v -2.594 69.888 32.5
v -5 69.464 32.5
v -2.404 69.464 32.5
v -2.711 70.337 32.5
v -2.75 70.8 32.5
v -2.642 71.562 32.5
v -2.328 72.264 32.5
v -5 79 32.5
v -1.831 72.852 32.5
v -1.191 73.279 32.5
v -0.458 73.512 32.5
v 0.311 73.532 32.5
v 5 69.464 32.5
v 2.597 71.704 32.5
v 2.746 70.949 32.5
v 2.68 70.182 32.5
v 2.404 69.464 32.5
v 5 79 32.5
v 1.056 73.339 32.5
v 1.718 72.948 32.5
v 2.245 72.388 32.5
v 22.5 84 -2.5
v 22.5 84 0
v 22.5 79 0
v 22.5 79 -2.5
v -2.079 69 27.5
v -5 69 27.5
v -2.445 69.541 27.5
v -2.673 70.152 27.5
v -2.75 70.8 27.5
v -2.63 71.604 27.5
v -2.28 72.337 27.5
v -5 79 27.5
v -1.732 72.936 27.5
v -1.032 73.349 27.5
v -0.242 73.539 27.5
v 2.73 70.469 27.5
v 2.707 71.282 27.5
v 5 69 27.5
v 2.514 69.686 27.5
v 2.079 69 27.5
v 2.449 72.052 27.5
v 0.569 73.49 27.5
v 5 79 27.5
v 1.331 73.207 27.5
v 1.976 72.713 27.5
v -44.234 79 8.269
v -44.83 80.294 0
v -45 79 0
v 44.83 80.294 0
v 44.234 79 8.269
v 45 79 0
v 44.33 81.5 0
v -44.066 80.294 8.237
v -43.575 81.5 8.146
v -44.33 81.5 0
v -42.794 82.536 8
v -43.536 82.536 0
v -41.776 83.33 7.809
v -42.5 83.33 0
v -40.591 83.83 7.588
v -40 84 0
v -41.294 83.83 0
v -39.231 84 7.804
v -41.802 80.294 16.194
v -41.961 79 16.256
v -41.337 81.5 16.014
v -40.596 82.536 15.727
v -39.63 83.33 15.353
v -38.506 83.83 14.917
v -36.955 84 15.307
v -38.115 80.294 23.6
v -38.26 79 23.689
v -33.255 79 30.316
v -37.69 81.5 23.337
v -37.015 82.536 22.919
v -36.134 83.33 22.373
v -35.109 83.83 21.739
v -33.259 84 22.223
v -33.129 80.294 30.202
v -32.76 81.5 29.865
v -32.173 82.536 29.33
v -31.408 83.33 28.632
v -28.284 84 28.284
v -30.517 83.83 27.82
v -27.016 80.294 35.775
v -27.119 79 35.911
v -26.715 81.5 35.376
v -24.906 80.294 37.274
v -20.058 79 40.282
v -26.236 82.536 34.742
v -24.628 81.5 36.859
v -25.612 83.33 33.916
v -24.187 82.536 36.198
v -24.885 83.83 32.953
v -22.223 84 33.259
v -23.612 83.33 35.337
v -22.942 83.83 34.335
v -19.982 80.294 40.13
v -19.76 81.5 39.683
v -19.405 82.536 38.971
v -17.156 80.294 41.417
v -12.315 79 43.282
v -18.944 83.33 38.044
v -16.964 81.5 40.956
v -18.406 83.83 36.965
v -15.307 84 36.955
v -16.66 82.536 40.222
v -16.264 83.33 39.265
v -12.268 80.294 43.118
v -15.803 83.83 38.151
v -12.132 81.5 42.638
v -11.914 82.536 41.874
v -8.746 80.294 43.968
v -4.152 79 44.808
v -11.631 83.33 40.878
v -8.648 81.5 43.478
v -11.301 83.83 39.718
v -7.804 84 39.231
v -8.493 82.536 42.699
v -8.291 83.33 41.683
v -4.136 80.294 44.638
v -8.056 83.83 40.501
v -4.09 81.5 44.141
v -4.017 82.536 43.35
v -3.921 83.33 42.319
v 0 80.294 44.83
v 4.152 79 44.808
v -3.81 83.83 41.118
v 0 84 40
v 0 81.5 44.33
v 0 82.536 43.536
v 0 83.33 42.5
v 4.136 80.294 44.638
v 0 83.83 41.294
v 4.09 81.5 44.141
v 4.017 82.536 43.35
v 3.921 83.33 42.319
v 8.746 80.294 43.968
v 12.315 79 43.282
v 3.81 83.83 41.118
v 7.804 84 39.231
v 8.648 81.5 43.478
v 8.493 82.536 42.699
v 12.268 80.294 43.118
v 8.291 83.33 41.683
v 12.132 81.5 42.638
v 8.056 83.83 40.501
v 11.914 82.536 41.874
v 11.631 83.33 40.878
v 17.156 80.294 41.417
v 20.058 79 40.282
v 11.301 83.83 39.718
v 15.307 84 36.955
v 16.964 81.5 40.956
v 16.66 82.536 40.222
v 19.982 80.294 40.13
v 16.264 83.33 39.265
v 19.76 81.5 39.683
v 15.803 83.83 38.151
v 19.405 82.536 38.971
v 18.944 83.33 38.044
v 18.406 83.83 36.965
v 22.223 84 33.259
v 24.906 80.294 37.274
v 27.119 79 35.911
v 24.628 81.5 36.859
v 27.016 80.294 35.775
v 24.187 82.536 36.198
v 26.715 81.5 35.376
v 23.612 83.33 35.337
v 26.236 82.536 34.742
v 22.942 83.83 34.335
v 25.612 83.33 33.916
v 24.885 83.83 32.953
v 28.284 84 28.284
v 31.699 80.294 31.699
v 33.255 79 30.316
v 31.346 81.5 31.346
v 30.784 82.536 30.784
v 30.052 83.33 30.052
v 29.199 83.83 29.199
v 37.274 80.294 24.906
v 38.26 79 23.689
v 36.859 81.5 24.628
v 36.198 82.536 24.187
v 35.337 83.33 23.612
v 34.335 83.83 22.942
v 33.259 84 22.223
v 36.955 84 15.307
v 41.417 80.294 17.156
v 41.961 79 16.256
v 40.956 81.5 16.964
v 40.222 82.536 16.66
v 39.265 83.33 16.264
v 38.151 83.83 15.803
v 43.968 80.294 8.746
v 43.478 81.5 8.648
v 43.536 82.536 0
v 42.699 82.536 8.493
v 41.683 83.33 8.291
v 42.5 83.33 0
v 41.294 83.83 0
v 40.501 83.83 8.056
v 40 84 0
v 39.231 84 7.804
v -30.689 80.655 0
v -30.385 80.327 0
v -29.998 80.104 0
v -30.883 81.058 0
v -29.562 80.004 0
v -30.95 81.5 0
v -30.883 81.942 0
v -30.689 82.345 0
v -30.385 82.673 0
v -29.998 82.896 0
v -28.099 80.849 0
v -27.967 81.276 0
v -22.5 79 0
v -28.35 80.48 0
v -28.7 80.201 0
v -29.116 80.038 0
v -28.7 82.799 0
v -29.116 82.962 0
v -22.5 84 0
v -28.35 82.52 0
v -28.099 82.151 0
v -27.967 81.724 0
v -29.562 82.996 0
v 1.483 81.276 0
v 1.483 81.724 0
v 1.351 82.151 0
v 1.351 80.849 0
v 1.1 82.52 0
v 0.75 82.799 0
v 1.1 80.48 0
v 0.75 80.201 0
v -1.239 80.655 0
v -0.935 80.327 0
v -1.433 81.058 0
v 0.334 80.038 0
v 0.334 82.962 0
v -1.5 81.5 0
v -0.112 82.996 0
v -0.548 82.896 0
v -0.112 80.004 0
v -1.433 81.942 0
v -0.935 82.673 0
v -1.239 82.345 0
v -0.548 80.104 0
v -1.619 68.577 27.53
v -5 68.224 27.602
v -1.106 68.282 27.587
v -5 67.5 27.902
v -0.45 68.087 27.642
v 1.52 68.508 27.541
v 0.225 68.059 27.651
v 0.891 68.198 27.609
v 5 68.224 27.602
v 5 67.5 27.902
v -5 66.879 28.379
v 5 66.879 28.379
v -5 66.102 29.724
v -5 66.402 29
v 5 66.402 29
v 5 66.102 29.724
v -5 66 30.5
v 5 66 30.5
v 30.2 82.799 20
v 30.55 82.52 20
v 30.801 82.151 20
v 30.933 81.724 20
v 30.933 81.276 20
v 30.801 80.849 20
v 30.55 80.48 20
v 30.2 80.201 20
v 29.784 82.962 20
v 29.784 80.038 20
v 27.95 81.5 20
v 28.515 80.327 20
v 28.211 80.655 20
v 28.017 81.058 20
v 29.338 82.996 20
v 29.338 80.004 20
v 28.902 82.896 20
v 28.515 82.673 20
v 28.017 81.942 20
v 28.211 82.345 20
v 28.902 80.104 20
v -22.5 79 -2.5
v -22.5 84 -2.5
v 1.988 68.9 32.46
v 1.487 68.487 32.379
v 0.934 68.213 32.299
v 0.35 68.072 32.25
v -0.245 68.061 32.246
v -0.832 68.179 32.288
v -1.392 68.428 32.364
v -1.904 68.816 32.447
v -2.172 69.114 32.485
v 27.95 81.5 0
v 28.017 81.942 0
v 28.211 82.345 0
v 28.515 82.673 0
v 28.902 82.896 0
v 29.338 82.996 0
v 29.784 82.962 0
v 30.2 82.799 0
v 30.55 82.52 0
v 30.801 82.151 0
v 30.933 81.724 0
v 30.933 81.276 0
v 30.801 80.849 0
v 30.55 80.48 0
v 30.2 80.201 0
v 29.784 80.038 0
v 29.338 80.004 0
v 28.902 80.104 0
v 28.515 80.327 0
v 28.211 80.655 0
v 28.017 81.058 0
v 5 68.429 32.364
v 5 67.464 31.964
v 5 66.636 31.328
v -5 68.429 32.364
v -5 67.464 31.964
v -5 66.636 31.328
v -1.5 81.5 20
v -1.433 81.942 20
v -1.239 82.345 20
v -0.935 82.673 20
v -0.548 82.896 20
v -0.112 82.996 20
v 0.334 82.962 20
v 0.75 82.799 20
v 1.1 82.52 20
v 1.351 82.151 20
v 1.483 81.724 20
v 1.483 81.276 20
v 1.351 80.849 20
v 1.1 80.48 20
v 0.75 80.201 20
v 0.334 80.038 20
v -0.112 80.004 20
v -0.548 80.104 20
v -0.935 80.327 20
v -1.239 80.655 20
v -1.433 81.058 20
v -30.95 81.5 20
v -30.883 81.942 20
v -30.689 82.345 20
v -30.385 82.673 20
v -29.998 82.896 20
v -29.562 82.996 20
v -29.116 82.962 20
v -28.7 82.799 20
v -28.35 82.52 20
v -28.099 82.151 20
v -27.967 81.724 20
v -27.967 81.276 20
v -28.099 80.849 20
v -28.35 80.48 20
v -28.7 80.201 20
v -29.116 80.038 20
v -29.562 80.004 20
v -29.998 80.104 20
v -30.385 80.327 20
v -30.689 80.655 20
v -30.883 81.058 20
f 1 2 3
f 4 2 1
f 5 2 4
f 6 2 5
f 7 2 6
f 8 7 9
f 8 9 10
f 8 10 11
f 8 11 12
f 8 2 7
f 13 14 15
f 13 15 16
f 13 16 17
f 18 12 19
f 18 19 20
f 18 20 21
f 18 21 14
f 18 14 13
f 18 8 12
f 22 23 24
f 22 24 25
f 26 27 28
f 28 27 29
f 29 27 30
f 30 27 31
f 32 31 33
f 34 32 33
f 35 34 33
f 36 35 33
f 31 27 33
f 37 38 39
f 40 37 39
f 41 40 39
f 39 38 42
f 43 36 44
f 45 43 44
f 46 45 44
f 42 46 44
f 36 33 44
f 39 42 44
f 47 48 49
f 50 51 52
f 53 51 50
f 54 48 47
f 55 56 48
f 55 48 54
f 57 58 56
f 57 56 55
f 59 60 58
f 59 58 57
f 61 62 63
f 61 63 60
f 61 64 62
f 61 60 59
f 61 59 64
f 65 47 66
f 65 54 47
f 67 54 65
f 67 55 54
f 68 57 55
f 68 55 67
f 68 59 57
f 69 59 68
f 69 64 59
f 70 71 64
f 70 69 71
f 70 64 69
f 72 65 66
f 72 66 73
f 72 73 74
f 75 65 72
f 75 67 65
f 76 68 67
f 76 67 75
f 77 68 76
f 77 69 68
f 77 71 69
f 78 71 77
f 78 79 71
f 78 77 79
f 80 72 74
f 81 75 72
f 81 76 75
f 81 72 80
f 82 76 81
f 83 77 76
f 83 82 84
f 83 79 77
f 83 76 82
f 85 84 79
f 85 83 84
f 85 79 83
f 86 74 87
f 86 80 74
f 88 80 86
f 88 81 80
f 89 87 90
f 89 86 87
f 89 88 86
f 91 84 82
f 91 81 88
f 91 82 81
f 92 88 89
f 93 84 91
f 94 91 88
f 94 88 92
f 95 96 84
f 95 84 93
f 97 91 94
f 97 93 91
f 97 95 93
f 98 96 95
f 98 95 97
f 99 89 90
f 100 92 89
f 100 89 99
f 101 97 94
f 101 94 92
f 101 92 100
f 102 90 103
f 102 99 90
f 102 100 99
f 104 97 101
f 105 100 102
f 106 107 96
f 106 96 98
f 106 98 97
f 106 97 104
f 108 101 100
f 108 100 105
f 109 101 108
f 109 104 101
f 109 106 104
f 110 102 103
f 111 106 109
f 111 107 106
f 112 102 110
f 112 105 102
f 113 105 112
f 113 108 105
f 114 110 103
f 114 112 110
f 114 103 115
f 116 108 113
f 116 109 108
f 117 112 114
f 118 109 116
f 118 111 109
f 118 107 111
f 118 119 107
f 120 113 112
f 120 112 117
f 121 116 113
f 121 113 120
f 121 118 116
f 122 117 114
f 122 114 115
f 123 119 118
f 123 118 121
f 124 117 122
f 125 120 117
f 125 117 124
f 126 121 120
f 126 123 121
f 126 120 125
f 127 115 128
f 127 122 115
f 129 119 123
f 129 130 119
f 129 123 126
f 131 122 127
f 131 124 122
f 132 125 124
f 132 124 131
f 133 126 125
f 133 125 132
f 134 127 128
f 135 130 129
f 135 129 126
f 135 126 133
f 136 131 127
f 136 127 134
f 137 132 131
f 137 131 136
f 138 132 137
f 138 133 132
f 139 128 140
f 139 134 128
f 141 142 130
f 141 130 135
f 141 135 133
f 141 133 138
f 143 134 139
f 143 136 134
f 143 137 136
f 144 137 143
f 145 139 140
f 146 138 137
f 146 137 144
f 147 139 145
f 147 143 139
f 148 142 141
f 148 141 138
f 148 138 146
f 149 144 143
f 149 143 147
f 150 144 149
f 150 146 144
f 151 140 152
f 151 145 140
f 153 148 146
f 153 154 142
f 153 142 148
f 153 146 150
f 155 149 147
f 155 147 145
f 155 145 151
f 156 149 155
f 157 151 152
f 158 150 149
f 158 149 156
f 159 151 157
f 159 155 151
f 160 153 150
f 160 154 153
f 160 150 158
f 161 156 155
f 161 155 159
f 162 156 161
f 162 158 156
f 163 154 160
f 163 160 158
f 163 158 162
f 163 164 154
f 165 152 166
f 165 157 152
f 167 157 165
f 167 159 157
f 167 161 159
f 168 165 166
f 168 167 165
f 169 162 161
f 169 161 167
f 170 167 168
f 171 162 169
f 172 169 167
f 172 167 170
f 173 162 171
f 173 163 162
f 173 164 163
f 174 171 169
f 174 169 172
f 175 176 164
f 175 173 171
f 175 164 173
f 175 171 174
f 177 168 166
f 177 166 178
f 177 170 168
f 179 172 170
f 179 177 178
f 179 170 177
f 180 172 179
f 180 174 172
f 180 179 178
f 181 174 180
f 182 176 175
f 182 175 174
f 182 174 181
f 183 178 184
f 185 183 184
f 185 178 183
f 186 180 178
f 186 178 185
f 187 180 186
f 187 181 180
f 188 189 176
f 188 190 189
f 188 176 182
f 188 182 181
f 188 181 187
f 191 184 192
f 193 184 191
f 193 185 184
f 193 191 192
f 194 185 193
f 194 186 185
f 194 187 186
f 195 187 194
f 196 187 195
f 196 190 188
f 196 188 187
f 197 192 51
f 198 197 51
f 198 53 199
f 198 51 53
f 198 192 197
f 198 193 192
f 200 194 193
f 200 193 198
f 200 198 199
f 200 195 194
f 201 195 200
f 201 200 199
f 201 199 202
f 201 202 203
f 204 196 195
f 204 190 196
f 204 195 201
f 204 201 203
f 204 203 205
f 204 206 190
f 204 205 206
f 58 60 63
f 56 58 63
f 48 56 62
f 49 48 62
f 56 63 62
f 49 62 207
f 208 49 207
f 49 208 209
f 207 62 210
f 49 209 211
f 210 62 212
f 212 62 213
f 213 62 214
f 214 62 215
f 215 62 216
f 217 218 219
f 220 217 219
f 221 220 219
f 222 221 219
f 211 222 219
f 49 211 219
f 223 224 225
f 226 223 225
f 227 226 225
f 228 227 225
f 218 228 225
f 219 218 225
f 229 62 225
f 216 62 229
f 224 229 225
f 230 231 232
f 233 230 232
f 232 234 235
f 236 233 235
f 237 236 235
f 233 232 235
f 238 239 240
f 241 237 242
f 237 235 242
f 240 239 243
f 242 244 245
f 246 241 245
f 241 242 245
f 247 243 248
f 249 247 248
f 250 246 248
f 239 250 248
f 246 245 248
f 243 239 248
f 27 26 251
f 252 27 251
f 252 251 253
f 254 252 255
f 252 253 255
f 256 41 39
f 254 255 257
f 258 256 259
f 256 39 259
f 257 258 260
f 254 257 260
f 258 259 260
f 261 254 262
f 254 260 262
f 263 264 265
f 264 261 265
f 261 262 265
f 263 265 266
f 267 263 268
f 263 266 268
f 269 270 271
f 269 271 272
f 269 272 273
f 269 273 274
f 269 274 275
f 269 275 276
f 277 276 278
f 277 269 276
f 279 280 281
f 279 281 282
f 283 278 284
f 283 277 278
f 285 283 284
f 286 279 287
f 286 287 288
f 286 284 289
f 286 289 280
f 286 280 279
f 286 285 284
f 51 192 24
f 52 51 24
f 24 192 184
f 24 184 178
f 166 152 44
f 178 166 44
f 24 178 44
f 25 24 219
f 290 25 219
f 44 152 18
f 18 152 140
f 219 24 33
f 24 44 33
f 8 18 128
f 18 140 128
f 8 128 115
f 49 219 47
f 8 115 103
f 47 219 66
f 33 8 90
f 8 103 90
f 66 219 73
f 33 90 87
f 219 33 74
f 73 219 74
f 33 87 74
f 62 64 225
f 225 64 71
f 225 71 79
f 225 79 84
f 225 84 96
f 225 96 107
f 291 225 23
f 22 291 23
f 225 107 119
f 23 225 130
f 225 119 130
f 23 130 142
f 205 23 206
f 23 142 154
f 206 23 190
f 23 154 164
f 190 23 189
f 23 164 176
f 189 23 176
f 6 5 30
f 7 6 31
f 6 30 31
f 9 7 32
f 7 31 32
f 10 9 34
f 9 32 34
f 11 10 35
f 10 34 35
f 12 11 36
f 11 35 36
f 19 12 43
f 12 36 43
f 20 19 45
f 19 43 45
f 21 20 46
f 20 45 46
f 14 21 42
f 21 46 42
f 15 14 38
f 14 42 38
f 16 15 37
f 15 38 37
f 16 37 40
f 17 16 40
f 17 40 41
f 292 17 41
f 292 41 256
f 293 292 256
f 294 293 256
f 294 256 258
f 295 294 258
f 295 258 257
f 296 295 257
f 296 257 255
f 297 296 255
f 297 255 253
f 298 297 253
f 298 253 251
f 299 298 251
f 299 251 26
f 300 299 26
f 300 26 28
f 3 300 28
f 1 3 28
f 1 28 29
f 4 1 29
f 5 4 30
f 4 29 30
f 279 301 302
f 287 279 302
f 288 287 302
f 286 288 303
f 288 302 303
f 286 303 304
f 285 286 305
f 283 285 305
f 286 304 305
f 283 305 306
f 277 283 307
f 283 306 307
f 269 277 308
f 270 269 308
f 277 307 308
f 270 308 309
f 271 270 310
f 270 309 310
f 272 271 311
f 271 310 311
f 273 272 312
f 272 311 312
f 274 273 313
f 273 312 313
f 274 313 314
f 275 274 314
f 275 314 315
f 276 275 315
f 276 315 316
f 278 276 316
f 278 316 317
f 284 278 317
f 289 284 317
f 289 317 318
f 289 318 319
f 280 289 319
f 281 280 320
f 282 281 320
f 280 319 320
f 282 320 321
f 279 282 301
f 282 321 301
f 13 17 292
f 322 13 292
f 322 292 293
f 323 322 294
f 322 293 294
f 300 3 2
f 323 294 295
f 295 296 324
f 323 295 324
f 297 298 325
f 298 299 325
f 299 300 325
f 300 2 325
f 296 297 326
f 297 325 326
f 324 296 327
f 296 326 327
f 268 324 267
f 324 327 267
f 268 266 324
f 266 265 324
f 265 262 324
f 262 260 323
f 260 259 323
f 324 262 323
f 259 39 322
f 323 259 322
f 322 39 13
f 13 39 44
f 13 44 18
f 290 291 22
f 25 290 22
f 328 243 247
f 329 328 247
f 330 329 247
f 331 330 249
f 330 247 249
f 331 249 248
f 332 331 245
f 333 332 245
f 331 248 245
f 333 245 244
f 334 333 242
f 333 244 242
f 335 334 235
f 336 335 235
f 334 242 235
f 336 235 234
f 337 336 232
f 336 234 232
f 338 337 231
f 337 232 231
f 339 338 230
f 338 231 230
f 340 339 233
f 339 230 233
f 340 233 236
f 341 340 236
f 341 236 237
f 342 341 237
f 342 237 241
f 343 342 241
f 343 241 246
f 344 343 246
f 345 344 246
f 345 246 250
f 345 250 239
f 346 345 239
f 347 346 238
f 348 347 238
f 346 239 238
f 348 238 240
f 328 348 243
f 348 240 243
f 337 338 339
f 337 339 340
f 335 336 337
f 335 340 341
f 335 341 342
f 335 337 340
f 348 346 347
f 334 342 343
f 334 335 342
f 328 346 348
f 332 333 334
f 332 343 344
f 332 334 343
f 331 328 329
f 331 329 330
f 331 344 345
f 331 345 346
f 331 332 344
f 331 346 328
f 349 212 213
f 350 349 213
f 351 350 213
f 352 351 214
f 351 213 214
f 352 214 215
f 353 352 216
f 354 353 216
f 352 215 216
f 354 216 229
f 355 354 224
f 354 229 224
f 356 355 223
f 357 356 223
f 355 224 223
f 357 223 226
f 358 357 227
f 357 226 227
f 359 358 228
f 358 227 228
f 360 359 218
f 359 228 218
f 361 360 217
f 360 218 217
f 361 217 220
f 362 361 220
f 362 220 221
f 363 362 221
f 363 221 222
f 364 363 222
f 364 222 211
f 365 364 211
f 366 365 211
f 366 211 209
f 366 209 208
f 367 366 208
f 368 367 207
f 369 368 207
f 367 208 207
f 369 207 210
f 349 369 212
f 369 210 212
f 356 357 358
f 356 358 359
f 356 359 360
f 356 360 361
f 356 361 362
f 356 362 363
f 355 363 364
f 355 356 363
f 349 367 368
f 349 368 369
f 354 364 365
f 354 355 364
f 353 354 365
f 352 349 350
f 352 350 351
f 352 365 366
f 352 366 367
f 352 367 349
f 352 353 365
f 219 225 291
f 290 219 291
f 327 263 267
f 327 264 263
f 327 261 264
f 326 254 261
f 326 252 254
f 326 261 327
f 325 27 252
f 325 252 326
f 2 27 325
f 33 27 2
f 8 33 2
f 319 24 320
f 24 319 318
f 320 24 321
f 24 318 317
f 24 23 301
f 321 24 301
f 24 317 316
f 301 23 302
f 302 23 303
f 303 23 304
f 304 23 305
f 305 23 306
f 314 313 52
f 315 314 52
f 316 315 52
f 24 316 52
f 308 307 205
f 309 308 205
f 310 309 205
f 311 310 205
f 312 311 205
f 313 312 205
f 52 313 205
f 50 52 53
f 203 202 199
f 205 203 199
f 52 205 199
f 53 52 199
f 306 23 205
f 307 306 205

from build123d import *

# Parameters (mm, degrees)
CUT_EXTRUDE1_DEPTH           = 5
CUT_EXTRUDE3_DEPTH           = 45
SKETCH8_R                    = 43
CUT_EXTRUDE4_DEPTH           = 32
SKETCH9_R                    = 32
SKETCH9_R_2                  = 24.5
CUT_EXTRUDE5_DEPTH           = 14
SKETCH10_R                   = 26
CUT_EXTRUDE6_DEPTH           = 14
FILLET1_R                    = 7
FILLET2_R                    = 7
SKETCH12_W                   = 6.590120242
SKETCH12_H                   = 30.5
CUT_REVOLVE1_ANGLE           = 60
CUT_REVOLVE1_OTHER_WAY_ANGLE = 60
CUT_EXTRUDE12_DEPTH          = 5
SKETCH18_W                   = 13
SKETCH18_H                   = 8
CUT_EXTRUDE13_DEPTH          = 5
INTERSECT1_OUTLINE_R         = 45
INTERSECT1_DEPTH             = 79
SKETCH20_W                   = 10
SKETCH20_H                   = 5
BOSS_EXTRUDE1_DEPTH          = 13
BOSS_EXTRUDE3_DEPTH          = 5
SKETCH19_R                   = 1.5
CUT_EXTRUDE14_DEPTH          = 20
SKETCH23_W                   = 25
SKETCH23_H                   = 7
CUT_EXTRUDE15_DEPTH          = 7
SKETCH24_W                   = 45
SKETCH24_H                   = 2.5
CUT_EXTRUDE16_DEPTH          = 5
SKETCH25_R                   = 2.75
CUT_EXTRUDE17_DEPTH          = 5
FILLET4_R                    = 3
FILLET6_R                    = 4


with BuildPart() as part:
    # Sketch1 → Revolve1 (revolve)
    with BuildSketch(Plane.XY, mode=Mode.PRIVATE) as revolve1_sk:
        with BuildLine():
            Line((22.5, 0), (32, 0))
            ThreePointArc((32, 0), (33.414213562, 0.585786438), (34, 2))
            Line((34, 2), (34, 18))
            Line((34, 18), (43, 18))
            ThreePointArc((43, 18), (44.414213562, 18.585786438), (45, 20))
            Line((45, 20), (45, 79))
            ThreePointArc((45, 79), (43.535533906, 82.535533906), (40, 84))
            Line((40, 84), (0, 84))
            Line((0, 84), (0, 18))
            Line((0, 18), (22.5, 18))
            Line((22.5, 18), (22.5, 0))
        make_face()
    revolve(revolve1_sk.sketch.rotate(Axis((0, 2, 0), (0, 1, 0)), 90), axis=Axis((0, 2, 0), (0, 1, 0)))

    # Sketch5 → Cut-Extrude1 (cut)
    with BuildSketch(Plane(origin=(0, 84, 0), x_dir=(1, 0, 0), z_dir=(0, 1, 0))):
        with BuildLine():
            Line((-45, 0), (-40, 0))
            Line((-40, 0), (40, 0))
            Line((40, 0), (45, 0))
            ThreePointArc((45, 0), (0, 45), (-45, 0))
        make_face()
    extrude(amount=-CUT_EXTRUDE1_DEPTH, mode=Mode.SUBTRACT)

    # Sketch7 → Cut-Extrude3 (cut)
    with BuildSketch(Plane.XZ.offset(-18)):
        with BuildLine():
            Line((-21, 0), (21, 0))
            ThreePointArc((21, 0), (0, -21), (-21, 0))
        make_face()
    extrude(amount=-CUT_EXTRUDE3_DEPTH, mode=Mode.SUBTRACT)

    # Sketch8 → Cut-Extrude4 (cut)
    with BuildSketch(Plane(origin=(0, 76.5, 0), x_dir=(1, 0, 0), z_dir=(0, 1, 0))):
        with Locations(Location((0, 0, 0), (0, 0, 270))):
            Circle(SKETCH8_R)
        with BuildLine():
            Line((22.912878475, -2), (-22.912878475, -2))
            ThreePointArc((-22.912878475, -2), (0, 23), (22.912878475, -2))
        make_face(mode=Mode.SUBTRACT)
    extrude(amount=-CUT_EXTRUDE4_DEPTH, mode=Mode.SUBTRACT)

    # Sketch9 → Cut-Extrude5 (cut)
    with BuildSketch(Plane(origin=(0, 2, 0), x_dir=(-1, 0, 0), z_dir=(0, -1, 0))):
        with Locations(Location((0, 0, 0), (0, 0, 90))):
            Circle(SKETCH9_R)
        with Locations(Location((0, 0, 0), (0, 0, 90))):
            Circle(SKETCH9_R_2, mode=Mode.SUBTRACT)
    extrude(amount=-CUT_EXTRUDE5_DEPTH, mode=Mode.SUBTRACT)

    # Sketch10 → Cut-Extrude6 (cut)
    with BuildSketch(Plane(origin=(0, 2, 0), x_dir=(-1, 0, 0), z_dir=(0, -1, 0))):
        Circle(SKETCH10_R)
    extrude(amount=-CUT_EXTRUDE6_DEPTH, mode=Mode.SUBTRACT)

    # Fillet1
    fillet1_edges = [part.edges().sort_by_distance(p)[0] for p in [
        (21, 40.5, 0),
        (-21, 40.5, 0),
    ]]
    fillet(fillet1_edges, radius=FILLET1_R)

    # Fillet2
    fillet2_edges = [part.edges().sort_by_distance(p)[0] for p in [
        (-22.912878475, 60.5, 2),
        (22.912878475, 60.5, 2),
    ]]
    fillet(fillet2_edges, radius=FILLET2_R)

    # Sketch12 → Cut-Revolve1 (revolve, cut)
    with BuildSketch(Plane(origin=(0, 0, 0), x_dir=(0, 0, -1), z_dir=(1, 0, 0))):
        with Locations((-40.662298382, 61.25)):
            Rectangle(SKETCH12_W, SKETCH12_H)
    revolve(axis=Axis((0, 99.14944168, 0), (0, 1, 0)), revolution_arc=CUT_REVOLVE1_ANGLE, mode=Mode.SUBTRACT)

    # Sketch12 → Cut-Revolve1 other way (revolve, cut)
    with BuildSketch(Plane(origin=(0, 0, 0), x_dir=(0, 0, -1), z_dir=(1, 0, 0))):
        with Locations((-40.662298382, 61.25)):
            Rectangle(SKETCH12_W, SKETCH12_H)
    revolve(axis=Axis((0, 99.14944168, 0), (0, -1, 0)), revolution_arc=CUT_REVOLVE1_OTHER_WAY_ANGLE, mode=Mode.SUBTRACT)

    # Sketch15 → Cut-Extrude12 (cut)
    with BuildSketch(Plane(origin=(0, 44.5, 0), x_dir=(1, 0, 0), z_dir=(0, 1, 0))):
        with BuildLine():
            Line((-28.124355653, -3.514579578), (-26.124355653, -3.514579578))
            ThreePointArc((-26.124355653, -3.514579578), (-24.710142091, -2.928793141), (-24.124355653, -1.514579578))
            Line((-24.124355653, -1.514579578), (-24.124355653, 8.485420422))
            ThreePointArc((-24.124355653, 8.485420422), (-24.710142091, 9.899633984), (-26.124355653, 10.485420422))
            Line((-26.124355653, 10.485420422), (-28.124355653, 10.485420422))
            ThreePointArc((-28.124355653, 10.485420422), (-29.538569215, 9.899633984), (-30.124355653, 8.485420422))
            Line((-30.124355653, 8.485420422), (-30.124355653, -1.514579578))
            ThreePointArc((-30.124355653, -1.514579578), (-29.538569215, -2.928793141), (-28.124355653, -3.514579578))
        make_face()
    extrude(amount=-CUT_EXTRUDE12_DEPTH, mode=Mode.SUBTRACT)

    # Sketch18 → Cut-Extrude13 (cut)
    with BuildSketch(Plane(origin=(0, 79, 0), x_dir=(1, 0, 0), z_dir=(0, 1, 0))):
        with Locations((0.796512215, 32.951769165)):
            Rectangle(SKETCH18_W, SKETCH18_H)
    extrude(amount=-CUT_EXTRUDE13_DEPTH, mode=Mode.SUBTRACT)

    # Intersect1: read off the stored shape, not the designer's step
    # Intersect1 outline → Intersect1 (cut)
    with BuildSketch(Plane(origin=(0, 0, 0), x_dir=(1, 0, 0), z_dir=(0, 1, 0))):
        Circle(INTERSECT1_OUTLINE_R)
    extrude(amount=INTERSECT1_DEPTH, mode=Mode.SUBTRACT)

    # Sketch20 → Boss-Extrude1 (add)
    with BuildSketch(Plane.XZ.offset(-79)):
        with Locations((0, 30)):
            Rectangle(SKETCH20_W, SKETCH20_H)
    extrude(amount=BOSS_EXTRUDE1_DEPTH)

    # Sketch22 → Boss-Extrude3 (add)
    with BuildSketch(Plane(origin=(0, 0, 0), x_dir=(-1, 0, 0), z_dir=(0, 0, -1))):
        with BuildLine():
            Line((40, 84), (-40, 84))
            ThreePointArc((-40, 84), (-43.535533906, 82.535533906), (-45, 79))
            Line((-45, 79), (45, 79))
            ThreePointArc((45, 79), (43.535533906, 82.535533906), (40, 84))
        make_face()
    extrude(amount=BOSS_EXTRUDE3_DEPTH)

    # Sketch19 → Cut-Extrude14 (cut)
    with BuildSketch(Plane(origin=(0, 0, 0), x_dir=(-1, 0, 0), z_dir=(0, 0, -1))):
        with Locations((0, 81.5)):
            Circle(SKETCH19_R)
        with Locations((-29.45, 81.5)):
            Circle(SKETCH19_R)
        with Locations((29.45, 81.5)):
            Circle(SKETCH19_R)
    extrude(amount=-CUT_EXTRUDE14_DEPTH, mode=Mode.SUBTRACT)

    # Sketch23 → Cut-Extrude15 (cut)
    with BuildSketch(Plane(origin=(0, 84, 0), x_dir=(1, 0, 0), z_dir=(0, 1, 0))):
        with Locations((-35, 3.5)):
            Rectangle(SKETCH23_W, SKETCH23_H)
        with Locations((35, 3.5)):
            Rectangle(SKETCH23_W, SKETCH23_H)
    extrude(amount=-CUT_EXTRUDE15_DEPTH, mode=Mode.SUBTRACT)

    # Sketch24 → Cut-Extrude16 (cut)
    with BuildSketch(Plane(origin=(0, 84, 0), x_dir=(1, 0, 0), z_dir=(0, 1, 0))):
        with Locations((0, 3.75)):
            Rectangle(SKETCH24_W, SKETCH24_H)
    extrude(amount=-CUT_EXTRUDE16_DEPTH, mode=Mode.SUBTRACT)

    # Sketch25 → Cut-Extrude17 (cut)
    with BuildSketch(Plane(origin=(0, 0, 27.5), x_dir=(-1, 0, 0), z_dir=(0, 0, -1))):
        with Locations((0, 70.8)):
            Circle(SKETCH25_R)
    extrude(amount=-CUT_EXTRUDE17_DEPTH, mode=Mode.SUBTRACT)

    # Fillet4
    # the kernel refuses this fillet: 3 mm, written as the material it takes off along each edge
    with BuildSketch(Plane(origin=(12.5, 66, 27.5), x_dir=(0, 1, 0), z_dir=(-1, 0, 0))) as fillet4_piece_1:
        with BuildLine():
            CenterArc((FILLET4_R, -FILLET4_R), FILLET4_R, 90, 90)
            Line((0, -FILLET4_R), (0, 0))
            Line((0, 0), (FILLET4_R, 0))
        make_face()
    extrude(amount=25, mode=Mode.SUBTRACT)

    # Fillet6
    # the kernel refuses this fillet: 4 mm, written as the material it takes off along each edge
    with BuildSketch(Plane(origin=(-13.660254038, 66, 32.5), x_dir=(0, 1, 0), z_dir=(1, 0, 0))) as fillet6_piece_1:
        with BuildLine():
            CenterArc((3.464101615, -4), FILLET6_R, 90, 60)
            Line((0, -2), (0, 0))
            Line((0, 0), (3.464101615, 0))
        make_face()
    extrude(amount=27.320508076, mode=Mode.SUBTRACT)


solid = part.part
